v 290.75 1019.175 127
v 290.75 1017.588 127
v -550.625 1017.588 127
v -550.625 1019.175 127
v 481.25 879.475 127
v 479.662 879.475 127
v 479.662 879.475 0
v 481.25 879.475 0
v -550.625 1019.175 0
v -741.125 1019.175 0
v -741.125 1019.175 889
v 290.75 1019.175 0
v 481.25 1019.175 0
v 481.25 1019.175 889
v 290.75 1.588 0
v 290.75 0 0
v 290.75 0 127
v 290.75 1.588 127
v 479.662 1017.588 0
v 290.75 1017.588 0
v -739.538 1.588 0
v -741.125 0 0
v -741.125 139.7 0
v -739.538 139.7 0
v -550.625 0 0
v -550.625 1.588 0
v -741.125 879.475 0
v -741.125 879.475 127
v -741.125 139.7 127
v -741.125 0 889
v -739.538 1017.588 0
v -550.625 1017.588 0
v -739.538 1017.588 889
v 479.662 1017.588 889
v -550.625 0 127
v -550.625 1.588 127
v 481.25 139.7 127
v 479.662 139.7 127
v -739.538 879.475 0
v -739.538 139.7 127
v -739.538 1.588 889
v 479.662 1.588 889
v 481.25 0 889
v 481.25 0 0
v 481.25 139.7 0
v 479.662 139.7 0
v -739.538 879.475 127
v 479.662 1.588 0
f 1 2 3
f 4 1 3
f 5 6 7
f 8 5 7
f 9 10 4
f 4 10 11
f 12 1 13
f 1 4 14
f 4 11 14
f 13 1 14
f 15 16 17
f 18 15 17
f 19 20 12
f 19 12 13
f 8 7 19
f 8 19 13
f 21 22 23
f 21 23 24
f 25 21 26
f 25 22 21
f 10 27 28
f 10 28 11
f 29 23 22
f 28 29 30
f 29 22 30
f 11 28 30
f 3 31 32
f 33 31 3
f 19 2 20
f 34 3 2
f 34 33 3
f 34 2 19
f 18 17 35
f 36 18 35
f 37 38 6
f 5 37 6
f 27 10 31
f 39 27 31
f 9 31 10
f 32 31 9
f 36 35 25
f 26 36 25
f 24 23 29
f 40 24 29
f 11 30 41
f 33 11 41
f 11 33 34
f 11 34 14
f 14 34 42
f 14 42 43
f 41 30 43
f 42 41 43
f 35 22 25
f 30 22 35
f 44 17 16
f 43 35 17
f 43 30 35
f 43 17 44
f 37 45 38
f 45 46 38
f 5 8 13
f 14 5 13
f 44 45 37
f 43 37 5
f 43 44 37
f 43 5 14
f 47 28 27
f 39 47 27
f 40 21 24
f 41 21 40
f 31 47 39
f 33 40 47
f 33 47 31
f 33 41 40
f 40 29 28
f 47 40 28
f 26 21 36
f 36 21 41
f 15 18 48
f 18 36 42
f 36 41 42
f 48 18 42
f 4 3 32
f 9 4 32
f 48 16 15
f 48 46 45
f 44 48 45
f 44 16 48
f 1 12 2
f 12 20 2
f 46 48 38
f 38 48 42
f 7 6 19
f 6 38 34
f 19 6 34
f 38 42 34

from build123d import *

# Parameters (mm, degrees)
F0_W     = 481.25
F0_H     = 350
F1_DEPTH = 401.25
F2_W     = 480
F2_H     = 400
F3_DEPTH = 350.001
F5_DEPTH = 481.251
F7_DEPTH = 401.251
F8_SCALE = 2.54


with BuildPart() as f1:
    # F0 (on Front) → F1 (new body)
    with BuildSketch(Plane.XZ):
        with Locations((240.625, 175)):
            Rectangle(F0_W, F0_H)
    extrude(amount=-F1_DEPTH)

    # F2 (on face) → F3 (cut, through all)
    with BuildSketch(Plane.XY.offset(350)):
        with Locations((240.625, 200.625)):
            Rectangle(F2_W, F2_H)
    extrude(amount=-F3_DEPTH, mode=Mode.SUBTRACT)

    # F4 (on face) → F5 (cut, through all)
    with BuildSketch(Plane(origin=(0, 0, 0), x_dir=(0, -1, 0), z_dir=(-1, 0, 0))):
        Polygon((-346.25, 50), (-346.25, 0), (-346.25, -50), (-55, -50), (-55, 50), align=None)
    extrude(amount=-F5_DEPTH, mode=Mode.SUBTRACT)

    # F6 (on face) → F7 (cut, through all)
    with BuildSketch(Plane.XZ):
        Polygon((75, 50), (75, 0), (75, -50), (406.25, -50), (406.25, 50), align=None)
    extrude(amount=-F7_DEPTH, mode=Mode.SUBTRACT)


with BuildPart() as f1_1:
    # F8: moved
    add(f1.part.scale(F8_SCALE).moved(Location((-741.125, 0, 0))))


solid = f1_1.part
